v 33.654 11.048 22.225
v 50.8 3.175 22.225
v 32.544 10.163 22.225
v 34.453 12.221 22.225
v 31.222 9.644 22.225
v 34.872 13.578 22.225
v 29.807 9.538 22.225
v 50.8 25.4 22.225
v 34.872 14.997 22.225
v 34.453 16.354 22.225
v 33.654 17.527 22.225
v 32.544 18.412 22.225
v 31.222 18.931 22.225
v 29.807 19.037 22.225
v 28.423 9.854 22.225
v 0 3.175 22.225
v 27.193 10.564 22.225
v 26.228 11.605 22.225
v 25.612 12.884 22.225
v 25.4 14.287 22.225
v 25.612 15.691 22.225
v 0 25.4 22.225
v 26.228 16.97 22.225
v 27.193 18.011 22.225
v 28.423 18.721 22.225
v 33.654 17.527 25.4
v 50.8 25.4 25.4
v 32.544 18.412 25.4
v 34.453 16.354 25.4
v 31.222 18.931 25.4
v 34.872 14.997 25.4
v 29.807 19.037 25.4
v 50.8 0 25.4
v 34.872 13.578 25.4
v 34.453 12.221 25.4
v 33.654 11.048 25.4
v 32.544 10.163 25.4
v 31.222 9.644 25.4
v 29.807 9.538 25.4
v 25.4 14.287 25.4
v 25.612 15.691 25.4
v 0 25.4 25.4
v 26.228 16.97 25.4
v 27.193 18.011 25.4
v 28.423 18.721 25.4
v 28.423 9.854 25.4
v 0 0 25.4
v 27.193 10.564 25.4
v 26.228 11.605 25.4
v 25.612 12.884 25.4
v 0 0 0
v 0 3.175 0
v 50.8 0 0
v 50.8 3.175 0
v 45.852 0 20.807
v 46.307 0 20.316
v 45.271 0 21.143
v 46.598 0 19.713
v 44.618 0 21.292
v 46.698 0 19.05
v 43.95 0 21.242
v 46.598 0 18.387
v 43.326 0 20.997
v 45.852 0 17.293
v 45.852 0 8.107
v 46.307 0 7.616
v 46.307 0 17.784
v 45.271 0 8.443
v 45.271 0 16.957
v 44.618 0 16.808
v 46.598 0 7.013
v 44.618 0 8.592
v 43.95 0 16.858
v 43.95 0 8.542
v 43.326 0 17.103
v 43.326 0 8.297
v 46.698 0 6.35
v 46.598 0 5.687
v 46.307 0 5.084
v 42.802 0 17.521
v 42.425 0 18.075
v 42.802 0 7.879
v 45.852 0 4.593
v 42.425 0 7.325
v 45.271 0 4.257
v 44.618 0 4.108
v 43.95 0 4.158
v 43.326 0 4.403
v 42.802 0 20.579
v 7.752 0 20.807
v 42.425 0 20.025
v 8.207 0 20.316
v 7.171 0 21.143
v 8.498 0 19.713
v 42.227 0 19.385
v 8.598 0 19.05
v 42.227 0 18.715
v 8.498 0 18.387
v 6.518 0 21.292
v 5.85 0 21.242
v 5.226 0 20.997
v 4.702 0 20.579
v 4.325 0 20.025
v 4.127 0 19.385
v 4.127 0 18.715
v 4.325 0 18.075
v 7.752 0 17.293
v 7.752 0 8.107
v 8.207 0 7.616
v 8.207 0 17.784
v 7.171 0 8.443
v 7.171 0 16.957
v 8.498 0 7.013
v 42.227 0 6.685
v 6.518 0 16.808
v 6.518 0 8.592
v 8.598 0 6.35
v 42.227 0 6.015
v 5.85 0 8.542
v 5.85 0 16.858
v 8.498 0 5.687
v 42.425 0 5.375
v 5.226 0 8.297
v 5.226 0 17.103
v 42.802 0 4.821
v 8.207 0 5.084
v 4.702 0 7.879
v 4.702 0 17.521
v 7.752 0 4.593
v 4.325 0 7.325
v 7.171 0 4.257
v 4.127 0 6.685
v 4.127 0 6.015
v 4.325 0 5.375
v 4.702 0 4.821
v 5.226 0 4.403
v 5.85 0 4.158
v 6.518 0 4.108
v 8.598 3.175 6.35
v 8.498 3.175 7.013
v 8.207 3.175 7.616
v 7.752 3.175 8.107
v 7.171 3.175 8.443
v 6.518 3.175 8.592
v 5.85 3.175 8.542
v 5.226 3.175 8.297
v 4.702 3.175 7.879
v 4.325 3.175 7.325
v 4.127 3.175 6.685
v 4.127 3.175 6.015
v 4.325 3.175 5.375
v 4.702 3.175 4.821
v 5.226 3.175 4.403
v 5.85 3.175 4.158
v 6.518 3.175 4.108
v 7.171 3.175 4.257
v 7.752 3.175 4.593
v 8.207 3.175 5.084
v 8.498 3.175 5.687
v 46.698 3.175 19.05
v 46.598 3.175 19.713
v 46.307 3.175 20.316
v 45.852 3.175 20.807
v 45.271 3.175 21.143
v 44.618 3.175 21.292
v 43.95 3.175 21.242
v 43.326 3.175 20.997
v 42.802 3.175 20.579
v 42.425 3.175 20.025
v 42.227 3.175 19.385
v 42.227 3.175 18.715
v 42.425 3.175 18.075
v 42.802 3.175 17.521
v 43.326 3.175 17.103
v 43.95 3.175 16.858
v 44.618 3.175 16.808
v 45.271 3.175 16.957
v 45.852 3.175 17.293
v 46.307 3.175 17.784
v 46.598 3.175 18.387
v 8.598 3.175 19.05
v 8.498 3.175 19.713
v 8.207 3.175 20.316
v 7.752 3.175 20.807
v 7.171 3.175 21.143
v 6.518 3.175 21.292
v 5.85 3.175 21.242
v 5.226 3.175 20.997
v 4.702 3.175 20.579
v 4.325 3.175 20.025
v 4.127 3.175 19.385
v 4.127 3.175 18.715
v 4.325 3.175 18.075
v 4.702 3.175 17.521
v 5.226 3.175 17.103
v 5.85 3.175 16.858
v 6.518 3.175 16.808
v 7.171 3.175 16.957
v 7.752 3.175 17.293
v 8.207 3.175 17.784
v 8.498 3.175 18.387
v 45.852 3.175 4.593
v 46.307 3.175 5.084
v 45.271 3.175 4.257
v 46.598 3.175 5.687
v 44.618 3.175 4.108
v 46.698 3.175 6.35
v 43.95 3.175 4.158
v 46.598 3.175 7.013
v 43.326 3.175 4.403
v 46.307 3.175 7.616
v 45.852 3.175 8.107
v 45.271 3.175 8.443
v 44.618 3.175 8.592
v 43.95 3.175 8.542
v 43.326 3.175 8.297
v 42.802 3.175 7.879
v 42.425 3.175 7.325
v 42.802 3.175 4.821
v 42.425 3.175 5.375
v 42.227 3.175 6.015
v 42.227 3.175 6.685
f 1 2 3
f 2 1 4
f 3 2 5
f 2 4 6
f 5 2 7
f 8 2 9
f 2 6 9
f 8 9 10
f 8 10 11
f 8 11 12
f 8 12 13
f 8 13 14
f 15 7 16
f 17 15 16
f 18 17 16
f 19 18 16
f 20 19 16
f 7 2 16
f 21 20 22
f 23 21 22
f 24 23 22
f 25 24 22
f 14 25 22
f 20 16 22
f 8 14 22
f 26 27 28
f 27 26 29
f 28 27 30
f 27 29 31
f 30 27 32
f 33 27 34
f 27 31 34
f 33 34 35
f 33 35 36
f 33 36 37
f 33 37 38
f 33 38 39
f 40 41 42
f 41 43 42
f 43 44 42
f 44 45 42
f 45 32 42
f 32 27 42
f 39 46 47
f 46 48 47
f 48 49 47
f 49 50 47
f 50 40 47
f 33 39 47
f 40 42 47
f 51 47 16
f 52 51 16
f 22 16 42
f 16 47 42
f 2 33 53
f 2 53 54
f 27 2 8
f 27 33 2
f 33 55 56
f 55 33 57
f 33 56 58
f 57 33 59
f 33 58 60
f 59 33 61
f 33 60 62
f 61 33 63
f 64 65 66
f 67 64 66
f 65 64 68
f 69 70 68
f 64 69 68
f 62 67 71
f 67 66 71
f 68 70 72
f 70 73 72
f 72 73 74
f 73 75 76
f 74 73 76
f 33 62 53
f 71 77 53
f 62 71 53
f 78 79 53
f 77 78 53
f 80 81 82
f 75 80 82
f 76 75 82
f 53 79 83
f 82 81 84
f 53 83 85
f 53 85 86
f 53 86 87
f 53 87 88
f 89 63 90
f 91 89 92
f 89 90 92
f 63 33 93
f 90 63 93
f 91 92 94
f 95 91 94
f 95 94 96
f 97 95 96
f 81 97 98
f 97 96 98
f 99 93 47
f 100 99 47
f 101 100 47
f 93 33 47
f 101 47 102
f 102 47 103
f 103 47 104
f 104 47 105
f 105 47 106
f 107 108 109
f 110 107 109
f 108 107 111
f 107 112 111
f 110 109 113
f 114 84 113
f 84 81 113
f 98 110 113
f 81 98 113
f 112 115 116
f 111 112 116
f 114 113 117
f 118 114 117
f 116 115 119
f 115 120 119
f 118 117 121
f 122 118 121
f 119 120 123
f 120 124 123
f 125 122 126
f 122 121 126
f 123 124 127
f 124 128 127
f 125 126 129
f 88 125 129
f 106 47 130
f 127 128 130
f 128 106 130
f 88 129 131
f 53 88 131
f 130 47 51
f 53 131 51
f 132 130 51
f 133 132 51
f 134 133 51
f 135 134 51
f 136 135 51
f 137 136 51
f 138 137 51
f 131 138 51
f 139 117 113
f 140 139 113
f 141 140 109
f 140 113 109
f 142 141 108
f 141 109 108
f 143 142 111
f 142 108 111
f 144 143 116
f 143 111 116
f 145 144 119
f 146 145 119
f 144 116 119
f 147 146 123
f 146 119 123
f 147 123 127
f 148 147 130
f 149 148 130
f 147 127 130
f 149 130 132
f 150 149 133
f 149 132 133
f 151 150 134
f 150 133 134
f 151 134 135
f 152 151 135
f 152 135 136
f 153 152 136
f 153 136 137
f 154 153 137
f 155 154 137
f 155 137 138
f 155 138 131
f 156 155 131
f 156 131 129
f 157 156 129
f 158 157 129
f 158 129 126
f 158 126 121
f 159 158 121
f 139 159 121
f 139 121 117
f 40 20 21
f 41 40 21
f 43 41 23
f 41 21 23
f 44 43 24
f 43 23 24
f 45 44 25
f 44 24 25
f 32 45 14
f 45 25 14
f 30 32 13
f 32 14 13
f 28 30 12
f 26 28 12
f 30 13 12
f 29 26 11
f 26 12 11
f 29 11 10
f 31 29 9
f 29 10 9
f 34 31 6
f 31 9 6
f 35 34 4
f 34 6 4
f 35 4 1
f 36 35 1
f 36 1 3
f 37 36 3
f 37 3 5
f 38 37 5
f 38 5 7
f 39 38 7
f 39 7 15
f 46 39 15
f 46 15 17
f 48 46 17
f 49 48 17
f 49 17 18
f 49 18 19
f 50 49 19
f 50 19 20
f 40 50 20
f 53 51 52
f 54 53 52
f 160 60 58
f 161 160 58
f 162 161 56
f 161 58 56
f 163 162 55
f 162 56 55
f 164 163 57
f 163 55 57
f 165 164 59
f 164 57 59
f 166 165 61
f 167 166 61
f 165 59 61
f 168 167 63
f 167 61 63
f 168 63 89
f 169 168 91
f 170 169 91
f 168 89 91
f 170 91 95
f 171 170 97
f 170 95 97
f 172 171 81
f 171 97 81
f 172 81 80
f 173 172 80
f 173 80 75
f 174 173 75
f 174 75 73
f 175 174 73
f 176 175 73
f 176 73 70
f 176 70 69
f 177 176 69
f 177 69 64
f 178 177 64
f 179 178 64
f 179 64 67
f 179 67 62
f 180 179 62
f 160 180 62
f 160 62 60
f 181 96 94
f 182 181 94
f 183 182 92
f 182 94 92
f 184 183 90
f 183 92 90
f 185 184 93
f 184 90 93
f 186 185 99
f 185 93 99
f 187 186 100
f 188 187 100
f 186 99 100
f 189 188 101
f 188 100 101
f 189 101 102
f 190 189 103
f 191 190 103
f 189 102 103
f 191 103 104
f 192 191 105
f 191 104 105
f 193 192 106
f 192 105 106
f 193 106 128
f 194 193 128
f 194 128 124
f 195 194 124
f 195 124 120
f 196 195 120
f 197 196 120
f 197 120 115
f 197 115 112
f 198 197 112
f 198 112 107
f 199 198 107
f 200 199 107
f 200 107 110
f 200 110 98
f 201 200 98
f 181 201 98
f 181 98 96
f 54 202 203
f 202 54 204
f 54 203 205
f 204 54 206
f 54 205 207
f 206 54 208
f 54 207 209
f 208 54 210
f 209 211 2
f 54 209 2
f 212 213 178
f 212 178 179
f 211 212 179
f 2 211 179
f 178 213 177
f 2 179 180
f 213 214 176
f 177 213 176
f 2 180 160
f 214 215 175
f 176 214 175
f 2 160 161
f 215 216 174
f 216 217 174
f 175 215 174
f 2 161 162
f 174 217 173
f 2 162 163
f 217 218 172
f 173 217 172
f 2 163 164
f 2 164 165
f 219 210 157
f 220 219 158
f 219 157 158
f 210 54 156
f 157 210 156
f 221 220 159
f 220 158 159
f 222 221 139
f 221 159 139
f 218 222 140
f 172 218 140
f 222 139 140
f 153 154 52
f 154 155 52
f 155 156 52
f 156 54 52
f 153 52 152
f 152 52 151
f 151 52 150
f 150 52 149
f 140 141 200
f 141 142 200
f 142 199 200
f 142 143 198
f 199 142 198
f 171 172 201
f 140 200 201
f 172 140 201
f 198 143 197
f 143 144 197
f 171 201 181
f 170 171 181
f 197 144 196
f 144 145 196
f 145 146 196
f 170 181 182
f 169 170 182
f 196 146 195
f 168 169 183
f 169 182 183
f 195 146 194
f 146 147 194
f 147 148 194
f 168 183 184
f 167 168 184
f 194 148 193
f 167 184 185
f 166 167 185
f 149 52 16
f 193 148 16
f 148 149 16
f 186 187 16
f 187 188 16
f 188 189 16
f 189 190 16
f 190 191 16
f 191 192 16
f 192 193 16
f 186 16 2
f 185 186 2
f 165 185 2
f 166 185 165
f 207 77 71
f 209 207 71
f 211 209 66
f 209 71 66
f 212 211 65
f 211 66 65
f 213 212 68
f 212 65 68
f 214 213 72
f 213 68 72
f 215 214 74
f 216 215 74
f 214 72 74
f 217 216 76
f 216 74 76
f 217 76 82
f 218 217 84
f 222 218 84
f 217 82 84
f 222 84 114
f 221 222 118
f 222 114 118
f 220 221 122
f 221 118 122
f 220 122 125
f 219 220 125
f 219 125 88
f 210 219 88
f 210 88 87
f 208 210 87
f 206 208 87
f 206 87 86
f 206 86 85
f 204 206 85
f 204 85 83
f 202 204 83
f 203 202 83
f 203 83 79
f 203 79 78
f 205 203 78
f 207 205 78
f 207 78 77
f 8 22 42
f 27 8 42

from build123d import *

# Parameters (mm, degrees)
F1_DEPTH = 50.8
F4_D     = 4.4958
F5_D     = 9.525


# Not quite as in the source:
# - a length typed as a fraction of an inch, garbled in the dataset ("3 / 203.2 mm" for 3/8 in), is restored


with BuildPart() as f1:
    # F0 (on Right) → F1 (new body)
    with BuildSketch(Plane.YZ):
        Polygon((0, 25.4), (0, 0), (3.175, 0), (3.175, 22.225), (25.4, 22.225), (25.4, 25.4), align=None)
    extrude(amount=F1_DEPTH)

    # F4 (through all)
    with Locations(Plane(origin=(0, 3.175, 0), x_dir=(-1, 0, 0), z_dir=(0, 1, 0))):
        with Locations((-44.45, 6.35), (-44.45, 19.05), (-6.35, 19.05), (-6.35, 6.35)):
            Hole(F4_D / 2)

    # F5 (through all)
    with Locations(Plane.XY.offset(25.4)):
        with Locations((30.1625, 14.2875)):
            Hole(F5_D / 2)


solid = f1.part
